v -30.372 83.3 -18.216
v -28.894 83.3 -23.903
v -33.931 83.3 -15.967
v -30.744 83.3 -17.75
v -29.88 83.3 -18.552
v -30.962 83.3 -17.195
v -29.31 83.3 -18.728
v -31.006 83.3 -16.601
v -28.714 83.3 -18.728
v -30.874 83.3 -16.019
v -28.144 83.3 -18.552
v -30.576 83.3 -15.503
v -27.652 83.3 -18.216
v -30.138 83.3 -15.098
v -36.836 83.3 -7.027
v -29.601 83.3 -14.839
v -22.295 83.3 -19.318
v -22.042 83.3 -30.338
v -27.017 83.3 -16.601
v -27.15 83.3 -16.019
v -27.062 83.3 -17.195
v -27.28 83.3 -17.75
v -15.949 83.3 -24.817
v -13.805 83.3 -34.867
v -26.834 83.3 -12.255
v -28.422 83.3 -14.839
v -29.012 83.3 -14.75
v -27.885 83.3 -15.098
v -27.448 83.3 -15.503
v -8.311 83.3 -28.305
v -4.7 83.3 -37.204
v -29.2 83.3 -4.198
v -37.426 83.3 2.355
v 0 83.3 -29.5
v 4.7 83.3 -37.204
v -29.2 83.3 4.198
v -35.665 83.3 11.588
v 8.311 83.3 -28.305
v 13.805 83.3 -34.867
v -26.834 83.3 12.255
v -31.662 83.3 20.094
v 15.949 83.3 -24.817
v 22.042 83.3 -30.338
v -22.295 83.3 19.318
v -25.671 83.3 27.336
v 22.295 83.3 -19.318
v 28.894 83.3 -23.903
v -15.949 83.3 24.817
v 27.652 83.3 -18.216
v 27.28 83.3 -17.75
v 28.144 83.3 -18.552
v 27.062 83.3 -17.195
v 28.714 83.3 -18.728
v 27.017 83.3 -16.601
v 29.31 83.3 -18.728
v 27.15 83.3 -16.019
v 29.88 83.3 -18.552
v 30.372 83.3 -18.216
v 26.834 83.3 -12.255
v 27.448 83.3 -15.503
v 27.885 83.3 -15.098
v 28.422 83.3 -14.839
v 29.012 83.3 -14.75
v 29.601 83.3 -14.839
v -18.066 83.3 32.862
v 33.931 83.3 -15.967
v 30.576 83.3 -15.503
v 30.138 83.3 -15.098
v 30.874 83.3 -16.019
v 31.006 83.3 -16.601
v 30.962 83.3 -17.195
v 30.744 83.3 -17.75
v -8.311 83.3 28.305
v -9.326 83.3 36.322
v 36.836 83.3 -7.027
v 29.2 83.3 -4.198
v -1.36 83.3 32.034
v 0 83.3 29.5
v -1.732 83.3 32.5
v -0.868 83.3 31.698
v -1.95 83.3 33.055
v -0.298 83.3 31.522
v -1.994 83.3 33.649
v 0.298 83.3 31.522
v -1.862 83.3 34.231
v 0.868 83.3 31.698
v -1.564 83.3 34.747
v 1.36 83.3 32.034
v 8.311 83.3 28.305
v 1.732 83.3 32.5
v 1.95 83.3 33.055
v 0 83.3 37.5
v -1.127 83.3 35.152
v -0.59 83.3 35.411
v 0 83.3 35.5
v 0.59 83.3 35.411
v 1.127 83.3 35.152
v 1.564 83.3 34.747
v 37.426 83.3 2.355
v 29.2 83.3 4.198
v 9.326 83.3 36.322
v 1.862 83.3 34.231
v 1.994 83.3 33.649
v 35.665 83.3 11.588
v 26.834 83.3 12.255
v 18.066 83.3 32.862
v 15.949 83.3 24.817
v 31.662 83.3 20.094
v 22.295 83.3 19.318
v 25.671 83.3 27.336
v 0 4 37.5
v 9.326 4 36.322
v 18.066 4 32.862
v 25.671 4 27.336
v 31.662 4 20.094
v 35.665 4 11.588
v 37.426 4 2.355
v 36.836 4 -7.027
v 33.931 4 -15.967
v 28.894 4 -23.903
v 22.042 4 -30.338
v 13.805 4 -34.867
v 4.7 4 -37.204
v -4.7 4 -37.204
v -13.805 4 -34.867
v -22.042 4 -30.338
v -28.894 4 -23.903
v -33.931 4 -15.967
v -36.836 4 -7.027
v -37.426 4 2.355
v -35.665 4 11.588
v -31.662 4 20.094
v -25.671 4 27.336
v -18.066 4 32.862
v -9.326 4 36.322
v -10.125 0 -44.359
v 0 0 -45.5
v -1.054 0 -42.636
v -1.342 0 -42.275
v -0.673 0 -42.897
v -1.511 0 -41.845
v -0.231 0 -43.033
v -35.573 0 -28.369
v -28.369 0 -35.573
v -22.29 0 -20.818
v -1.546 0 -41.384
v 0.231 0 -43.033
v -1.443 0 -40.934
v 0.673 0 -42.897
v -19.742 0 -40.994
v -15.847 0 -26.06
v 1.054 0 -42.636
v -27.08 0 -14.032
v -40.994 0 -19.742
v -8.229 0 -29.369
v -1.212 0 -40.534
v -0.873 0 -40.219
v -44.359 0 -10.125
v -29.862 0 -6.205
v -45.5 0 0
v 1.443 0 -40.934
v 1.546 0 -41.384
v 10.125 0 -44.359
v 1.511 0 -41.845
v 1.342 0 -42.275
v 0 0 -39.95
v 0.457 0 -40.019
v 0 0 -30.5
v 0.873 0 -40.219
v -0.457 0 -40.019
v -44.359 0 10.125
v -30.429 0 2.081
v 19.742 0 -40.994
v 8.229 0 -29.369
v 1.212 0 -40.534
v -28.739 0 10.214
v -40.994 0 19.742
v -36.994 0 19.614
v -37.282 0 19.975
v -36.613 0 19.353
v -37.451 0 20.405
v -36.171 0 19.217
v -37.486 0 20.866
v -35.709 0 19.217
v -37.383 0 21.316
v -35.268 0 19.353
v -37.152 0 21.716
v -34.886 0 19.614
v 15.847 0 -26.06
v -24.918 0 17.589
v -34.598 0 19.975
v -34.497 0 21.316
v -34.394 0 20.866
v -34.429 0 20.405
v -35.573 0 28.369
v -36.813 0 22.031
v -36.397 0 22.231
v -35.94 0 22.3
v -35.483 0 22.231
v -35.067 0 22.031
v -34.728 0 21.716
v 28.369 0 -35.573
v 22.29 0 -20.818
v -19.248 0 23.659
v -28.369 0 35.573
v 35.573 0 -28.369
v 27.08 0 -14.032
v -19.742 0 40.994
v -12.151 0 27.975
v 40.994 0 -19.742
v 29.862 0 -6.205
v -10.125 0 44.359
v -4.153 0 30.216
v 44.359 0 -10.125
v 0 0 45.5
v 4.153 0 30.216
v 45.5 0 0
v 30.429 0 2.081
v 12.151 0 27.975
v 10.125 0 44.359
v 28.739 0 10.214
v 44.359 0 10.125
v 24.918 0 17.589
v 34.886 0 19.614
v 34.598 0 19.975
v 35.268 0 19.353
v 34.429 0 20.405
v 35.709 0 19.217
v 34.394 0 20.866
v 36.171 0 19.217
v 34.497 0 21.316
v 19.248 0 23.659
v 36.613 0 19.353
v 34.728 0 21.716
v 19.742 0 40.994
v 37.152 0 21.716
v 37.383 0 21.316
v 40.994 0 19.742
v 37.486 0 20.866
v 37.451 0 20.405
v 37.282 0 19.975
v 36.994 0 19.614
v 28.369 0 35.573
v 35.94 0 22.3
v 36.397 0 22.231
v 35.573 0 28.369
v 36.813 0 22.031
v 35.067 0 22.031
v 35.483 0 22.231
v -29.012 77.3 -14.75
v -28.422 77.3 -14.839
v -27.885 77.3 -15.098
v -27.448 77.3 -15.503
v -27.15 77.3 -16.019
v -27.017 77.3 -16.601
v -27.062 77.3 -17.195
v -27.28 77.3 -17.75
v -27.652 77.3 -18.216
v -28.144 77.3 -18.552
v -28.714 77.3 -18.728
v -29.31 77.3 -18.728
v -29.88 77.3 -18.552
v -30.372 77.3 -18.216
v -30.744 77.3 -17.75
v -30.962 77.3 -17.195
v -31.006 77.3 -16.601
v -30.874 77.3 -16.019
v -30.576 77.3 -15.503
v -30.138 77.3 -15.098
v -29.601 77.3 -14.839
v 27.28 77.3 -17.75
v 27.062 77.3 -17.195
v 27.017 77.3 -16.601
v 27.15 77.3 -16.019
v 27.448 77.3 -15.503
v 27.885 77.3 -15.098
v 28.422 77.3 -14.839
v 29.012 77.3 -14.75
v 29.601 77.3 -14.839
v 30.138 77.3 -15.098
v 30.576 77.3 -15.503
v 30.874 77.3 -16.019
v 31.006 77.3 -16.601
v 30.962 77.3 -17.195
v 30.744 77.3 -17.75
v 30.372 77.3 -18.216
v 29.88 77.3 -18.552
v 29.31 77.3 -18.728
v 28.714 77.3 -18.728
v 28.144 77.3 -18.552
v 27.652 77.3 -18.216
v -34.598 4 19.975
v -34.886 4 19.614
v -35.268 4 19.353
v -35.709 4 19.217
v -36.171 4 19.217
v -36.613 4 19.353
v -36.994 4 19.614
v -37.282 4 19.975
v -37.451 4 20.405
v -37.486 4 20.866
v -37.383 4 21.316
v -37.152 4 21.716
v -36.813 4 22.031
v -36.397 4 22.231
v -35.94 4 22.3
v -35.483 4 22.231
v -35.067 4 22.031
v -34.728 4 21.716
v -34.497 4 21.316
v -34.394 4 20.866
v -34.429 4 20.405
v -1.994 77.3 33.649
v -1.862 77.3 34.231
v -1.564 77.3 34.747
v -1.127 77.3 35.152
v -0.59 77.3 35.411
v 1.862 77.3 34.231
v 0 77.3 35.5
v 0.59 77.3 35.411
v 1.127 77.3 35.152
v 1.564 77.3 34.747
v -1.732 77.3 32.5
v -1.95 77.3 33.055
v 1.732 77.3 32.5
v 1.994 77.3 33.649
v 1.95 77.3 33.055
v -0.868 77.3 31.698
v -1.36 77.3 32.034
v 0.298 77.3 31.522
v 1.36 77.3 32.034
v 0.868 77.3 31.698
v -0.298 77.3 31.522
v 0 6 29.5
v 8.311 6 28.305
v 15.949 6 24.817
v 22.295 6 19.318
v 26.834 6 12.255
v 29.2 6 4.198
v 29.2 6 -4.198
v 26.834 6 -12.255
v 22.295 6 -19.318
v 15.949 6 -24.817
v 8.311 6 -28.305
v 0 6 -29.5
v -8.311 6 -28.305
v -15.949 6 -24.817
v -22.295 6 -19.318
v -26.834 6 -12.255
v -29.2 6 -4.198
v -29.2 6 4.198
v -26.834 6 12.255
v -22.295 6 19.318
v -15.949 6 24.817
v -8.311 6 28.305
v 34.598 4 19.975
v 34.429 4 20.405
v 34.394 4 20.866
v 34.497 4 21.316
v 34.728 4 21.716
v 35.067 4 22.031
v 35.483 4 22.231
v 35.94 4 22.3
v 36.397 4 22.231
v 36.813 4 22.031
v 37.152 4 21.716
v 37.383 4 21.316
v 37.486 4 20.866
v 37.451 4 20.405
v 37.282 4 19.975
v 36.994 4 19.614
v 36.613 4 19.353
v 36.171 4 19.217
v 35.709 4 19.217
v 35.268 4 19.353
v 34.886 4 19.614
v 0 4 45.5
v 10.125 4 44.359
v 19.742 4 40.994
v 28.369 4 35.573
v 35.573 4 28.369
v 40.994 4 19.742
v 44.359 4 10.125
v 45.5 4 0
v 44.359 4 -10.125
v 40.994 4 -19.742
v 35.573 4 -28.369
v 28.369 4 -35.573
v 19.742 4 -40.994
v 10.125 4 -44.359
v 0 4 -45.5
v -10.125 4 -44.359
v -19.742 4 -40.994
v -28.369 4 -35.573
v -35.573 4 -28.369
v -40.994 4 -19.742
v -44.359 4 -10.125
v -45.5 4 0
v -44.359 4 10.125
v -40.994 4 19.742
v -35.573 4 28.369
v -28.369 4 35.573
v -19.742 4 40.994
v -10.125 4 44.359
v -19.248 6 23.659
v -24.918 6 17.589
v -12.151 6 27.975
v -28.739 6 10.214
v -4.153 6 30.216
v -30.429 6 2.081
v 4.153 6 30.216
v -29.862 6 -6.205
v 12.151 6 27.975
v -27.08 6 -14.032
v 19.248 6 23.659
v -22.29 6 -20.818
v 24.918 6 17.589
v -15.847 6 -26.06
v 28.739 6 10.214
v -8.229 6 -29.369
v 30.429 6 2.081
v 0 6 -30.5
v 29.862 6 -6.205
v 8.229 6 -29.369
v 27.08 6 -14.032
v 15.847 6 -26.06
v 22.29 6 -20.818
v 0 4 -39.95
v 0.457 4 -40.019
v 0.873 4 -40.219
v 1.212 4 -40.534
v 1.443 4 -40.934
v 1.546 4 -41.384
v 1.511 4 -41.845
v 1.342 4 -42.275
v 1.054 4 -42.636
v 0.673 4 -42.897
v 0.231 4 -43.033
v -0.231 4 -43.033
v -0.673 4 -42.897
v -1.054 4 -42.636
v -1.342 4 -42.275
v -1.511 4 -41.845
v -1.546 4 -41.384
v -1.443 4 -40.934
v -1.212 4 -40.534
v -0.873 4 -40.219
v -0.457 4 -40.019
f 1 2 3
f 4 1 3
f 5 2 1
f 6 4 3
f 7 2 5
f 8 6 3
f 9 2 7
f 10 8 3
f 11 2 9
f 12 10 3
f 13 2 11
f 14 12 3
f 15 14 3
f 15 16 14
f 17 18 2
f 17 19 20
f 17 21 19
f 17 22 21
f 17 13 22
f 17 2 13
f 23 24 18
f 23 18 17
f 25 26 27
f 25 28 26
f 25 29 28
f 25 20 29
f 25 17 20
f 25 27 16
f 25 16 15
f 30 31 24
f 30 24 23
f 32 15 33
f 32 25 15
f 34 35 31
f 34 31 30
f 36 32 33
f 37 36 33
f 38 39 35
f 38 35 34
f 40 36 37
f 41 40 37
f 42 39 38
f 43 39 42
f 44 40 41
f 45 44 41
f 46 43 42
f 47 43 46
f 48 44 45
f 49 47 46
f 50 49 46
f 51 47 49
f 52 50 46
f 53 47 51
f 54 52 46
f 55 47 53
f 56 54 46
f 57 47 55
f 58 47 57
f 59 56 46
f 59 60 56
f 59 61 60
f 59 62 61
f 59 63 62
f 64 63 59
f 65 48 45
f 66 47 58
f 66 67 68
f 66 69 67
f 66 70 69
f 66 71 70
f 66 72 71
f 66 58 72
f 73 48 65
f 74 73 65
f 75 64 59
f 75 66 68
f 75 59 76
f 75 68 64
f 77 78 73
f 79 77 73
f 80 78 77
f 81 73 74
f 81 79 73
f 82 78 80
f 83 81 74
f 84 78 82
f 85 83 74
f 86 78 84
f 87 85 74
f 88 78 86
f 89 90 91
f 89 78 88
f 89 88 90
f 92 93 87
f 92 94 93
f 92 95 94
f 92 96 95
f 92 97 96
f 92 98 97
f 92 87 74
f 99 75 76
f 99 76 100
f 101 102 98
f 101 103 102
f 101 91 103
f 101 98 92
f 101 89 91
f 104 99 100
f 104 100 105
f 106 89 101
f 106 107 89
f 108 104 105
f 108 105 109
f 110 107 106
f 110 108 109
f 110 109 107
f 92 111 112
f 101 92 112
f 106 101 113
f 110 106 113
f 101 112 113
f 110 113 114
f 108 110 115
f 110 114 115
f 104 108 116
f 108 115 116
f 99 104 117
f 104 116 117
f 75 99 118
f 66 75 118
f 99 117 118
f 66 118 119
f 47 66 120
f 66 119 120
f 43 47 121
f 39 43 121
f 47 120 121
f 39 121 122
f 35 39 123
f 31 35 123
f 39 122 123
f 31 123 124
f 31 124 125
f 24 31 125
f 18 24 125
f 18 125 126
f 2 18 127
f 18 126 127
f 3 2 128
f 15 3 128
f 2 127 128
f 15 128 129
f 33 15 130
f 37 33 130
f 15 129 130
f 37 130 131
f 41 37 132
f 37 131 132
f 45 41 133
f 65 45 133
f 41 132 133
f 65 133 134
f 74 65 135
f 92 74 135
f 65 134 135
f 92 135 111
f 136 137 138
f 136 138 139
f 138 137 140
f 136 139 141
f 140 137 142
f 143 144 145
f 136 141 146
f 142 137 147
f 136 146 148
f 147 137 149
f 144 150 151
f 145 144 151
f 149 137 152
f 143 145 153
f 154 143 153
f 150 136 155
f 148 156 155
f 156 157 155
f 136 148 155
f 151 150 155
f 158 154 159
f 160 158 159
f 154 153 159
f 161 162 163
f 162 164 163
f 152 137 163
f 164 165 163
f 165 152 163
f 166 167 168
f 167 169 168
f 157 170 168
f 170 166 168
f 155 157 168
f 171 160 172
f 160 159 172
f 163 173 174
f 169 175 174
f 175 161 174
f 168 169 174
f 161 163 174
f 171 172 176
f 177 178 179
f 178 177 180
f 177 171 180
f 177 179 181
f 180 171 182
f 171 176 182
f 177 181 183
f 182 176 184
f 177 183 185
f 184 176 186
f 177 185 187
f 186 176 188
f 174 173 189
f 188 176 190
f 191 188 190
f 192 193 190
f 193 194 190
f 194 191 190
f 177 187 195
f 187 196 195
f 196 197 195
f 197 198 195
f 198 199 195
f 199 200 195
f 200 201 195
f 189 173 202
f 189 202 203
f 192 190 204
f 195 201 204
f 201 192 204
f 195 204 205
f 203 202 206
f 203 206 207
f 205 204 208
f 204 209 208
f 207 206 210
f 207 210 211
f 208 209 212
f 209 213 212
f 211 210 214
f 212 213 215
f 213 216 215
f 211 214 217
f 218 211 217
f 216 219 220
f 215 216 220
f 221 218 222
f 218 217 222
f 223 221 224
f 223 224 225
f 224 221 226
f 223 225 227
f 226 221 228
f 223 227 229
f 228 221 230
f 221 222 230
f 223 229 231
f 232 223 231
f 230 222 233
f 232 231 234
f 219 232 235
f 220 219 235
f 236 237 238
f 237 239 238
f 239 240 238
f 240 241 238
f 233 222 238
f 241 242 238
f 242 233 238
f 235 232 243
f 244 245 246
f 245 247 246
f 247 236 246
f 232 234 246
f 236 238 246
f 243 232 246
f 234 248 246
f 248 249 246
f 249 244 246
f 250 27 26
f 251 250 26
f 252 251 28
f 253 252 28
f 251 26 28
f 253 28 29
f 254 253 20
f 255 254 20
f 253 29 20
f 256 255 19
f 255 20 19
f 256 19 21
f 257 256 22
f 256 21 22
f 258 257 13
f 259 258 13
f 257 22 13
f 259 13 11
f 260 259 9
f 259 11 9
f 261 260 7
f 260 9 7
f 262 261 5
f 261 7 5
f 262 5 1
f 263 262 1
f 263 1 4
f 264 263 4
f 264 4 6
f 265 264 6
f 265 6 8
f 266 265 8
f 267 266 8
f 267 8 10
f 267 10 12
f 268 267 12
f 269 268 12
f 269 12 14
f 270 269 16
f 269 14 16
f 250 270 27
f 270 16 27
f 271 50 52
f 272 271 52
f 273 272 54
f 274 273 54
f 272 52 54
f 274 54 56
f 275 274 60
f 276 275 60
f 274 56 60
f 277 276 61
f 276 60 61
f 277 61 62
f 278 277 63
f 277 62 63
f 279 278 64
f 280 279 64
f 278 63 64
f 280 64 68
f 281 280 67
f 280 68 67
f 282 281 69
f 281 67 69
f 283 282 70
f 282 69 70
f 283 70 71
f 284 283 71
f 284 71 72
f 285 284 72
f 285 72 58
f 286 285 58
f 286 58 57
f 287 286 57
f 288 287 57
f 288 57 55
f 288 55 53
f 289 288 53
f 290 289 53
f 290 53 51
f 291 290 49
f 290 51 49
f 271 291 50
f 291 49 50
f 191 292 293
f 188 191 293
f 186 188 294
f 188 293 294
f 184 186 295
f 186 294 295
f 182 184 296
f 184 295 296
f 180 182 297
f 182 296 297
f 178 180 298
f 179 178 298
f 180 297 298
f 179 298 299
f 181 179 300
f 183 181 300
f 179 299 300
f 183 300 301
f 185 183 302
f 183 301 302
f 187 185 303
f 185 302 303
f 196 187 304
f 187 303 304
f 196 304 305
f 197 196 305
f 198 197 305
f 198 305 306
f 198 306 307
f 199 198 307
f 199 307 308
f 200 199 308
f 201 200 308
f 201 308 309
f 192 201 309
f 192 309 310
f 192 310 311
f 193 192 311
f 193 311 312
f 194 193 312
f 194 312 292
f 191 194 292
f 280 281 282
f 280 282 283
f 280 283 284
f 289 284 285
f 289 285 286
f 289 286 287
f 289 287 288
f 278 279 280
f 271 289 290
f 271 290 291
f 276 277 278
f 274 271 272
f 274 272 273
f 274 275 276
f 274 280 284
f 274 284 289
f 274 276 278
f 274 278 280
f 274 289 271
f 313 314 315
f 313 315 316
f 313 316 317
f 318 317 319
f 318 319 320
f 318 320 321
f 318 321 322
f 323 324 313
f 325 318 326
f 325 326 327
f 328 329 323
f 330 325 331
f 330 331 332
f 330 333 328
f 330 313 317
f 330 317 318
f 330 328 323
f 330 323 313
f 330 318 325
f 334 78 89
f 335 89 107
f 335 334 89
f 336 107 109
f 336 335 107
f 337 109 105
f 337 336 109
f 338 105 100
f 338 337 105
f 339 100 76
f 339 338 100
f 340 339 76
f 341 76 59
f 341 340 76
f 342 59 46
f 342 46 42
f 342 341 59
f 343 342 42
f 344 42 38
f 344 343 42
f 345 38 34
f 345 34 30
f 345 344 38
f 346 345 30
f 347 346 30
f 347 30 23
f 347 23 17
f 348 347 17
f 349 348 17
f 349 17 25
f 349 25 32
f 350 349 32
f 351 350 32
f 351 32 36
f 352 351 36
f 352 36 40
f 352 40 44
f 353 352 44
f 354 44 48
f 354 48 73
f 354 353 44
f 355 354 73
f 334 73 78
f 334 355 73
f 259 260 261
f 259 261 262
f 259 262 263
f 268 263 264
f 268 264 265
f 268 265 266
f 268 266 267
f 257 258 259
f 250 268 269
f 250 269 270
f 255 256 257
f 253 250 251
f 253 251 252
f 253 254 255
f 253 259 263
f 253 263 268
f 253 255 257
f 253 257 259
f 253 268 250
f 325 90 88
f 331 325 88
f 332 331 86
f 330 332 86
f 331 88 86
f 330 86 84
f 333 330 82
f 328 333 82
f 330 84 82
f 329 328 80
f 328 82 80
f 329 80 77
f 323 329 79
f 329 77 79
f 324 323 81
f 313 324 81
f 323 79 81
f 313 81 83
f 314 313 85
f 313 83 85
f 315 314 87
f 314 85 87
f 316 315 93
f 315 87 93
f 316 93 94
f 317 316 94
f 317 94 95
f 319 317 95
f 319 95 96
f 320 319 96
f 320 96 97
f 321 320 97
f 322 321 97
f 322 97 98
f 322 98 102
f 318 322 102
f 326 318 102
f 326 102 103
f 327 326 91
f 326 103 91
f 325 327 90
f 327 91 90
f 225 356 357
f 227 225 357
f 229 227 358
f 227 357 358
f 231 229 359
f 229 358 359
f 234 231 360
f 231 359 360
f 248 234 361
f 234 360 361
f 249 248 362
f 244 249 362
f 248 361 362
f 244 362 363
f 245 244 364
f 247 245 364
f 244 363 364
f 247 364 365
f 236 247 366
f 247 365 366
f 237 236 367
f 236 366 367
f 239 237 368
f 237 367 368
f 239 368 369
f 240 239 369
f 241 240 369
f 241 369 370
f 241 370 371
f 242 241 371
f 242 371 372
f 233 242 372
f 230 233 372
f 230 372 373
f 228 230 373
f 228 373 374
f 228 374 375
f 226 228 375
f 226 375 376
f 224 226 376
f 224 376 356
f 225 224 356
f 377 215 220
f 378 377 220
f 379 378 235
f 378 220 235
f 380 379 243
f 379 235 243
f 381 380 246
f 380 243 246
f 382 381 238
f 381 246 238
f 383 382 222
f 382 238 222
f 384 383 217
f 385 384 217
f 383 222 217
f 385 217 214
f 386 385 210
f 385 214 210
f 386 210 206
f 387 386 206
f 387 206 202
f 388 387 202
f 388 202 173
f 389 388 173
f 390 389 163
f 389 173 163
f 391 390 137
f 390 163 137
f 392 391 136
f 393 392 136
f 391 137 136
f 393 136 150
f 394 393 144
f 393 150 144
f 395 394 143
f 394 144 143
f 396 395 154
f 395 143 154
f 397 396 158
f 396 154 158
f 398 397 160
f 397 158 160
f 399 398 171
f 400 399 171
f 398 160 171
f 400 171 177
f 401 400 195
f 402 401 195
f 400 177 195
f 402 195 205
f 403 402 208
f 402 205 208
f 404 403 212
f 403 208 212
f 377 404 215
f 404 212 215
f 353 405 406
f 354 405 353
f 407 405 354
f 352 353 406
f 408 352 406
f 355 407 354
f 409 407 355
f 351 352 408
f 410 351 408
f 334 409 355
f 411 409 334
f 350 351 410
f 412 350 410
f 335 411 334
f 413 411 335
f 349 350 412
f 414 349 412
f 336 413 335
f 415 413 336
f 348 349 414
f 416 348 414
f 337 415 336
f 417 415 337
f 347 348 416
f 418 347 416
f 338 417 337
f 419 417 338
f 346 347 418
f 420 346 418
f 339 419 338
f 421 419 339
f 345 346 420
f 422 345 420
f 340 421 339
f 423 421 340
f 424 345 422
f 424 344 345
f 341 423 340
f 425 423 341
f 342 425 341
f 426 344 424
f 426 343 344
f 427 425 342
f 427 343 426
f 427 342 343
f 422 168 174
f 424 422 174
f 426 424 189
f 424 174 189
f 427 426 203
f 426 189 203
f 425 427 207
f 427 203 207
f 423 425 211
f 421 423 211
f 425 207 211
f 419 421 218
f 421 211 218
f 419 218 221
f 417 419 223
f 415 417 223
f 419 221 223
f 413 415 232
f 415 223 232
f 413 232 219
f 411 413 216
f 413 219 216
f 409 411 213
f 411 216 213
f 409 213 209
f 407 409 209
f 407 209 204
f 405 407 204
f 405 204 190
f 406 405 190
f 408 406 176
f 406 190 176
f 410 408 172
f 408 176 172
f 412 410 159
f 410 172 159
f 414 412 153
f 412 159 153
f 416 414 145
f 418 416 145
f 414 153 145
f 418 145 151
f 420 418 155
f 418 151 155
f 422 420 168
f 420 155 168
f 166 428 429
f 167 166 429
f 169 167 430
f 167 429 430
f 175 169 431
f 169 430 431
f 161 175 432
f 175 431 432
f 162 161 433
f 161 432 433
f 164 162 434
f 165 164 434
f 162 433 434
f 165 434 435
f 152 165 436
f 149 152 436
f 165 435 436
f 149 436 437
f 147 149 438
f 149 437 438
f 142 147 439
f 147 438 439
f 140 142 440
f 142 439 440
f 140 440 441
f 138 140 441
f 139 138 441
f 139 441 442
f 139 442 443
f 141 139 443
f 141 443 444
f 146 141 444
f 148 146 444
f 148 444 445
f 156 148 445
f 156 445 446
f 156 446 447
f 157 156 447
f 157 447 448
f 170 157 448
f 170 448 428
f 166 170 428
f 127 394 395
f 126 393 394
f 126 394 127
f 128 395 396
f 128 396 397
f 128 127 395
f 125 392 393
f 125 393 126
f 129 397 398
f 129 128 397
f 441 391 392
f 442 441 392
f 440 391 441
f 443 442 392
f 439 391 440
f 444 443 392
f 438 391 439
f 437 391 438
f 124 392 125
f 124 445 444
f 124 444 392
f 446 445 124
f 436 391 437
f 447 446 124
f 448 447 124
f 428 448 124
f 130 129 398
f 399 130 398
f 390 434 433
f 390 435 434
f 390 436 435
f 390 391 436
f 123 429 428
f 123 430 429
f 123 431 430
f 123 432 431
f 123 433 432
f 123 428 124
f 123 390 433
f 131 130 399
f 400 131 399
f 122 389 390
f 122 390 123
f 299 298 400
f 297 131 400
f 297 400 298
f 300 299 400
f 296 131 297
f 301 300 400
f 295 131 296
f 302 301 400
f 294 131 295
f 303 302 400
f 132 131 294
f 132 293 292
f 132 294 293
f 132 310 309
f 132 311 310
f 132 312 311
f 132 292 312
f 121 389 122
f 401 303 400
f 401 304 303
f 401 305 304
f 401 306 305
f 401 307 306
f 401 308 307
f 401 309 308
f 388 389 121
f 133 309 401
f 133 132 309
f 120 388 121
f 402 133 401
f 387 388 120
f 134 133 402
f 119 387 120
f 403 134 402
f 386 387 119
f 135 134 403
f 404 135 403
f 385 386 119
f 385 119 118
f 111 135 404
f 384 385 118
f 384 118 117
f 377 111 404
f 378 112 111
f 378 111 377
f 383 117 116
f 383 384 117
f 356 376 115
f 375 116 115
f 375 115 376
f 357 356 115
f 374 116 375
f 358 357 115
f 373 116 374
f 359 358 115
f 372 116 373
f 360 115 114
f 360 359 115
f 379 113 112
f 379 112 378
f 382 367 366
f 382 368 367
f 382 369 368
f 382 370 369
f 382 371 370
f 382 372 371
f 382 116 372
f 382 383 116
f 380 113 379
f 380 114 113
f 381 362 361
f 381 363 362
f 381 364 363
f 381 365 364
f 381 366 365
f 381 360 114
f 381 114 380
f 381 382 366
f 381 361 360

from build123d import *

# Parameters (mm, degrees)
SKETCH1_R           = 45.5
SKETCH1_R_2         = 29.5
BOSS_EXTRUDE1_DEPTH = 4
SKETCH2_R           = 37.5
SKETCH2_R_2         = 29.5
BOSS_EXTRUDE2_DEPTH = 79.3
SKETCH4_R           = 1.55
CUT_EXTRUDE1_DEPTH  = 83.3
CIRPATTERN1_COUNT   = 3
SKETCH6_R           = 2
CUT_EXTRUDE2_DEPTH  = 6
CIRPATTERN2_COUNT   = 3
SKETCH8_R           = 30.5
CUT_EXTRUDE4_DEPTH  = 6


with BuildPart() as part:
    # Sketch1 → Boss-Extrude1 (new body)
    with BuildSketch(Plane(origin=(0, 0, 0), x_dir=(1, 0, 0), z_dir=(0, 1, 0))):
        with Locations(Location((0, 0, 0), (0, 0, 270))):
            Circle(SKETCH1_R)
        with Locations(Location((0, 0, 0), (0, 0, 270))):
            Circle(SKETCH1_R_2, mode=Mode.SUBTRACT)
    extrude(amount=BOSS_EXTRUDE1_DEPTH)

    # Sketch2 → Boss-Extrude2 (add)
    with BuildSketch(Plane(origin=(0, 4, 0), x_dir=(1, 0, 0), z_dir=(0, 1, 0))):
        with Locations(Location((0, 0, 0), (0, 0, 270))):
            Circle(SKETCH2_R)
        with Locations(Location((0, 0, 0), (0, 0, 270))):
            Circle(SKETCH2_R_2, mode=Mode.SUBTRACT)
    extrude(amount=BOSS_EXTRUDE2_DEPTH)

    # Sketch4 → Cut-Extrude1 (cut)
    with BuildSketch(Plane(origin=(0, 4, 0), x_dir=(1, 0, 0), z_dir=(0, 1, 0))):
        with Locations(Location((0, 41.5, 0), (0, 0, 270))):
            Circle(SKETCH4_R)
    cut_extrude1 = extrude(amount=-CUT_EXTRUDE1_DEPTH, mode=Mode.SUBTRACT)

    # CirPattern1: Cut-Extrude1 ×3 about axis
    cirpattern1_axis = Axis((0, 0, 0), (0, 1, 0))
    for i in range(1, CIRPATTERN1_COUNT):
        add(cut_extrude1.rotate(cirpattern1_axis, i * 360 / CIRPATTERN1_COUNT), mode=Mode.SUBTRACT)

    # Sketch6 → Cut-Extrude2 (cut)
    with BuildSketch(Plane(origin=(0, 83.3, 0), x_dir=(1, 0, 0), z_dir=(0, 1, 0))):
        with Locations(Location((-29.011851027, 16.75, 0), (0, 0, 270))):
            Circle(SKETCH6_R)
    cut_extrude2 = extrude(amount=-CUT_EXTRUDE2_DEPTH, mode=Mode.SUBTRACT)

    # CirPattern2: Cut-Extrude2 ×3 about axis
    cirpattern2_axis = Axis((0, 0, 0), (0, 1, 0))
    for i in range(1, CIRPATTERN2_COUNT):
        add(cut_extrude2.rotate(cirpattern2_axis, i * 360 / CIRPATTERN2_COUNT), mode=Mode.SUBTRACT)

    # Sketch8 → Cut-Extrude4 (cut)
    with BuildSketch(Plane.XZ):
        with Locations(Location((0, 0, 0), (0, 0, 270))):
            Circle(SKETCH8_R)
    extrude(amount=-CUT_EXTRUDE4_DEPTH, mode=Mode.SUBTRACT)


solid = part.part
